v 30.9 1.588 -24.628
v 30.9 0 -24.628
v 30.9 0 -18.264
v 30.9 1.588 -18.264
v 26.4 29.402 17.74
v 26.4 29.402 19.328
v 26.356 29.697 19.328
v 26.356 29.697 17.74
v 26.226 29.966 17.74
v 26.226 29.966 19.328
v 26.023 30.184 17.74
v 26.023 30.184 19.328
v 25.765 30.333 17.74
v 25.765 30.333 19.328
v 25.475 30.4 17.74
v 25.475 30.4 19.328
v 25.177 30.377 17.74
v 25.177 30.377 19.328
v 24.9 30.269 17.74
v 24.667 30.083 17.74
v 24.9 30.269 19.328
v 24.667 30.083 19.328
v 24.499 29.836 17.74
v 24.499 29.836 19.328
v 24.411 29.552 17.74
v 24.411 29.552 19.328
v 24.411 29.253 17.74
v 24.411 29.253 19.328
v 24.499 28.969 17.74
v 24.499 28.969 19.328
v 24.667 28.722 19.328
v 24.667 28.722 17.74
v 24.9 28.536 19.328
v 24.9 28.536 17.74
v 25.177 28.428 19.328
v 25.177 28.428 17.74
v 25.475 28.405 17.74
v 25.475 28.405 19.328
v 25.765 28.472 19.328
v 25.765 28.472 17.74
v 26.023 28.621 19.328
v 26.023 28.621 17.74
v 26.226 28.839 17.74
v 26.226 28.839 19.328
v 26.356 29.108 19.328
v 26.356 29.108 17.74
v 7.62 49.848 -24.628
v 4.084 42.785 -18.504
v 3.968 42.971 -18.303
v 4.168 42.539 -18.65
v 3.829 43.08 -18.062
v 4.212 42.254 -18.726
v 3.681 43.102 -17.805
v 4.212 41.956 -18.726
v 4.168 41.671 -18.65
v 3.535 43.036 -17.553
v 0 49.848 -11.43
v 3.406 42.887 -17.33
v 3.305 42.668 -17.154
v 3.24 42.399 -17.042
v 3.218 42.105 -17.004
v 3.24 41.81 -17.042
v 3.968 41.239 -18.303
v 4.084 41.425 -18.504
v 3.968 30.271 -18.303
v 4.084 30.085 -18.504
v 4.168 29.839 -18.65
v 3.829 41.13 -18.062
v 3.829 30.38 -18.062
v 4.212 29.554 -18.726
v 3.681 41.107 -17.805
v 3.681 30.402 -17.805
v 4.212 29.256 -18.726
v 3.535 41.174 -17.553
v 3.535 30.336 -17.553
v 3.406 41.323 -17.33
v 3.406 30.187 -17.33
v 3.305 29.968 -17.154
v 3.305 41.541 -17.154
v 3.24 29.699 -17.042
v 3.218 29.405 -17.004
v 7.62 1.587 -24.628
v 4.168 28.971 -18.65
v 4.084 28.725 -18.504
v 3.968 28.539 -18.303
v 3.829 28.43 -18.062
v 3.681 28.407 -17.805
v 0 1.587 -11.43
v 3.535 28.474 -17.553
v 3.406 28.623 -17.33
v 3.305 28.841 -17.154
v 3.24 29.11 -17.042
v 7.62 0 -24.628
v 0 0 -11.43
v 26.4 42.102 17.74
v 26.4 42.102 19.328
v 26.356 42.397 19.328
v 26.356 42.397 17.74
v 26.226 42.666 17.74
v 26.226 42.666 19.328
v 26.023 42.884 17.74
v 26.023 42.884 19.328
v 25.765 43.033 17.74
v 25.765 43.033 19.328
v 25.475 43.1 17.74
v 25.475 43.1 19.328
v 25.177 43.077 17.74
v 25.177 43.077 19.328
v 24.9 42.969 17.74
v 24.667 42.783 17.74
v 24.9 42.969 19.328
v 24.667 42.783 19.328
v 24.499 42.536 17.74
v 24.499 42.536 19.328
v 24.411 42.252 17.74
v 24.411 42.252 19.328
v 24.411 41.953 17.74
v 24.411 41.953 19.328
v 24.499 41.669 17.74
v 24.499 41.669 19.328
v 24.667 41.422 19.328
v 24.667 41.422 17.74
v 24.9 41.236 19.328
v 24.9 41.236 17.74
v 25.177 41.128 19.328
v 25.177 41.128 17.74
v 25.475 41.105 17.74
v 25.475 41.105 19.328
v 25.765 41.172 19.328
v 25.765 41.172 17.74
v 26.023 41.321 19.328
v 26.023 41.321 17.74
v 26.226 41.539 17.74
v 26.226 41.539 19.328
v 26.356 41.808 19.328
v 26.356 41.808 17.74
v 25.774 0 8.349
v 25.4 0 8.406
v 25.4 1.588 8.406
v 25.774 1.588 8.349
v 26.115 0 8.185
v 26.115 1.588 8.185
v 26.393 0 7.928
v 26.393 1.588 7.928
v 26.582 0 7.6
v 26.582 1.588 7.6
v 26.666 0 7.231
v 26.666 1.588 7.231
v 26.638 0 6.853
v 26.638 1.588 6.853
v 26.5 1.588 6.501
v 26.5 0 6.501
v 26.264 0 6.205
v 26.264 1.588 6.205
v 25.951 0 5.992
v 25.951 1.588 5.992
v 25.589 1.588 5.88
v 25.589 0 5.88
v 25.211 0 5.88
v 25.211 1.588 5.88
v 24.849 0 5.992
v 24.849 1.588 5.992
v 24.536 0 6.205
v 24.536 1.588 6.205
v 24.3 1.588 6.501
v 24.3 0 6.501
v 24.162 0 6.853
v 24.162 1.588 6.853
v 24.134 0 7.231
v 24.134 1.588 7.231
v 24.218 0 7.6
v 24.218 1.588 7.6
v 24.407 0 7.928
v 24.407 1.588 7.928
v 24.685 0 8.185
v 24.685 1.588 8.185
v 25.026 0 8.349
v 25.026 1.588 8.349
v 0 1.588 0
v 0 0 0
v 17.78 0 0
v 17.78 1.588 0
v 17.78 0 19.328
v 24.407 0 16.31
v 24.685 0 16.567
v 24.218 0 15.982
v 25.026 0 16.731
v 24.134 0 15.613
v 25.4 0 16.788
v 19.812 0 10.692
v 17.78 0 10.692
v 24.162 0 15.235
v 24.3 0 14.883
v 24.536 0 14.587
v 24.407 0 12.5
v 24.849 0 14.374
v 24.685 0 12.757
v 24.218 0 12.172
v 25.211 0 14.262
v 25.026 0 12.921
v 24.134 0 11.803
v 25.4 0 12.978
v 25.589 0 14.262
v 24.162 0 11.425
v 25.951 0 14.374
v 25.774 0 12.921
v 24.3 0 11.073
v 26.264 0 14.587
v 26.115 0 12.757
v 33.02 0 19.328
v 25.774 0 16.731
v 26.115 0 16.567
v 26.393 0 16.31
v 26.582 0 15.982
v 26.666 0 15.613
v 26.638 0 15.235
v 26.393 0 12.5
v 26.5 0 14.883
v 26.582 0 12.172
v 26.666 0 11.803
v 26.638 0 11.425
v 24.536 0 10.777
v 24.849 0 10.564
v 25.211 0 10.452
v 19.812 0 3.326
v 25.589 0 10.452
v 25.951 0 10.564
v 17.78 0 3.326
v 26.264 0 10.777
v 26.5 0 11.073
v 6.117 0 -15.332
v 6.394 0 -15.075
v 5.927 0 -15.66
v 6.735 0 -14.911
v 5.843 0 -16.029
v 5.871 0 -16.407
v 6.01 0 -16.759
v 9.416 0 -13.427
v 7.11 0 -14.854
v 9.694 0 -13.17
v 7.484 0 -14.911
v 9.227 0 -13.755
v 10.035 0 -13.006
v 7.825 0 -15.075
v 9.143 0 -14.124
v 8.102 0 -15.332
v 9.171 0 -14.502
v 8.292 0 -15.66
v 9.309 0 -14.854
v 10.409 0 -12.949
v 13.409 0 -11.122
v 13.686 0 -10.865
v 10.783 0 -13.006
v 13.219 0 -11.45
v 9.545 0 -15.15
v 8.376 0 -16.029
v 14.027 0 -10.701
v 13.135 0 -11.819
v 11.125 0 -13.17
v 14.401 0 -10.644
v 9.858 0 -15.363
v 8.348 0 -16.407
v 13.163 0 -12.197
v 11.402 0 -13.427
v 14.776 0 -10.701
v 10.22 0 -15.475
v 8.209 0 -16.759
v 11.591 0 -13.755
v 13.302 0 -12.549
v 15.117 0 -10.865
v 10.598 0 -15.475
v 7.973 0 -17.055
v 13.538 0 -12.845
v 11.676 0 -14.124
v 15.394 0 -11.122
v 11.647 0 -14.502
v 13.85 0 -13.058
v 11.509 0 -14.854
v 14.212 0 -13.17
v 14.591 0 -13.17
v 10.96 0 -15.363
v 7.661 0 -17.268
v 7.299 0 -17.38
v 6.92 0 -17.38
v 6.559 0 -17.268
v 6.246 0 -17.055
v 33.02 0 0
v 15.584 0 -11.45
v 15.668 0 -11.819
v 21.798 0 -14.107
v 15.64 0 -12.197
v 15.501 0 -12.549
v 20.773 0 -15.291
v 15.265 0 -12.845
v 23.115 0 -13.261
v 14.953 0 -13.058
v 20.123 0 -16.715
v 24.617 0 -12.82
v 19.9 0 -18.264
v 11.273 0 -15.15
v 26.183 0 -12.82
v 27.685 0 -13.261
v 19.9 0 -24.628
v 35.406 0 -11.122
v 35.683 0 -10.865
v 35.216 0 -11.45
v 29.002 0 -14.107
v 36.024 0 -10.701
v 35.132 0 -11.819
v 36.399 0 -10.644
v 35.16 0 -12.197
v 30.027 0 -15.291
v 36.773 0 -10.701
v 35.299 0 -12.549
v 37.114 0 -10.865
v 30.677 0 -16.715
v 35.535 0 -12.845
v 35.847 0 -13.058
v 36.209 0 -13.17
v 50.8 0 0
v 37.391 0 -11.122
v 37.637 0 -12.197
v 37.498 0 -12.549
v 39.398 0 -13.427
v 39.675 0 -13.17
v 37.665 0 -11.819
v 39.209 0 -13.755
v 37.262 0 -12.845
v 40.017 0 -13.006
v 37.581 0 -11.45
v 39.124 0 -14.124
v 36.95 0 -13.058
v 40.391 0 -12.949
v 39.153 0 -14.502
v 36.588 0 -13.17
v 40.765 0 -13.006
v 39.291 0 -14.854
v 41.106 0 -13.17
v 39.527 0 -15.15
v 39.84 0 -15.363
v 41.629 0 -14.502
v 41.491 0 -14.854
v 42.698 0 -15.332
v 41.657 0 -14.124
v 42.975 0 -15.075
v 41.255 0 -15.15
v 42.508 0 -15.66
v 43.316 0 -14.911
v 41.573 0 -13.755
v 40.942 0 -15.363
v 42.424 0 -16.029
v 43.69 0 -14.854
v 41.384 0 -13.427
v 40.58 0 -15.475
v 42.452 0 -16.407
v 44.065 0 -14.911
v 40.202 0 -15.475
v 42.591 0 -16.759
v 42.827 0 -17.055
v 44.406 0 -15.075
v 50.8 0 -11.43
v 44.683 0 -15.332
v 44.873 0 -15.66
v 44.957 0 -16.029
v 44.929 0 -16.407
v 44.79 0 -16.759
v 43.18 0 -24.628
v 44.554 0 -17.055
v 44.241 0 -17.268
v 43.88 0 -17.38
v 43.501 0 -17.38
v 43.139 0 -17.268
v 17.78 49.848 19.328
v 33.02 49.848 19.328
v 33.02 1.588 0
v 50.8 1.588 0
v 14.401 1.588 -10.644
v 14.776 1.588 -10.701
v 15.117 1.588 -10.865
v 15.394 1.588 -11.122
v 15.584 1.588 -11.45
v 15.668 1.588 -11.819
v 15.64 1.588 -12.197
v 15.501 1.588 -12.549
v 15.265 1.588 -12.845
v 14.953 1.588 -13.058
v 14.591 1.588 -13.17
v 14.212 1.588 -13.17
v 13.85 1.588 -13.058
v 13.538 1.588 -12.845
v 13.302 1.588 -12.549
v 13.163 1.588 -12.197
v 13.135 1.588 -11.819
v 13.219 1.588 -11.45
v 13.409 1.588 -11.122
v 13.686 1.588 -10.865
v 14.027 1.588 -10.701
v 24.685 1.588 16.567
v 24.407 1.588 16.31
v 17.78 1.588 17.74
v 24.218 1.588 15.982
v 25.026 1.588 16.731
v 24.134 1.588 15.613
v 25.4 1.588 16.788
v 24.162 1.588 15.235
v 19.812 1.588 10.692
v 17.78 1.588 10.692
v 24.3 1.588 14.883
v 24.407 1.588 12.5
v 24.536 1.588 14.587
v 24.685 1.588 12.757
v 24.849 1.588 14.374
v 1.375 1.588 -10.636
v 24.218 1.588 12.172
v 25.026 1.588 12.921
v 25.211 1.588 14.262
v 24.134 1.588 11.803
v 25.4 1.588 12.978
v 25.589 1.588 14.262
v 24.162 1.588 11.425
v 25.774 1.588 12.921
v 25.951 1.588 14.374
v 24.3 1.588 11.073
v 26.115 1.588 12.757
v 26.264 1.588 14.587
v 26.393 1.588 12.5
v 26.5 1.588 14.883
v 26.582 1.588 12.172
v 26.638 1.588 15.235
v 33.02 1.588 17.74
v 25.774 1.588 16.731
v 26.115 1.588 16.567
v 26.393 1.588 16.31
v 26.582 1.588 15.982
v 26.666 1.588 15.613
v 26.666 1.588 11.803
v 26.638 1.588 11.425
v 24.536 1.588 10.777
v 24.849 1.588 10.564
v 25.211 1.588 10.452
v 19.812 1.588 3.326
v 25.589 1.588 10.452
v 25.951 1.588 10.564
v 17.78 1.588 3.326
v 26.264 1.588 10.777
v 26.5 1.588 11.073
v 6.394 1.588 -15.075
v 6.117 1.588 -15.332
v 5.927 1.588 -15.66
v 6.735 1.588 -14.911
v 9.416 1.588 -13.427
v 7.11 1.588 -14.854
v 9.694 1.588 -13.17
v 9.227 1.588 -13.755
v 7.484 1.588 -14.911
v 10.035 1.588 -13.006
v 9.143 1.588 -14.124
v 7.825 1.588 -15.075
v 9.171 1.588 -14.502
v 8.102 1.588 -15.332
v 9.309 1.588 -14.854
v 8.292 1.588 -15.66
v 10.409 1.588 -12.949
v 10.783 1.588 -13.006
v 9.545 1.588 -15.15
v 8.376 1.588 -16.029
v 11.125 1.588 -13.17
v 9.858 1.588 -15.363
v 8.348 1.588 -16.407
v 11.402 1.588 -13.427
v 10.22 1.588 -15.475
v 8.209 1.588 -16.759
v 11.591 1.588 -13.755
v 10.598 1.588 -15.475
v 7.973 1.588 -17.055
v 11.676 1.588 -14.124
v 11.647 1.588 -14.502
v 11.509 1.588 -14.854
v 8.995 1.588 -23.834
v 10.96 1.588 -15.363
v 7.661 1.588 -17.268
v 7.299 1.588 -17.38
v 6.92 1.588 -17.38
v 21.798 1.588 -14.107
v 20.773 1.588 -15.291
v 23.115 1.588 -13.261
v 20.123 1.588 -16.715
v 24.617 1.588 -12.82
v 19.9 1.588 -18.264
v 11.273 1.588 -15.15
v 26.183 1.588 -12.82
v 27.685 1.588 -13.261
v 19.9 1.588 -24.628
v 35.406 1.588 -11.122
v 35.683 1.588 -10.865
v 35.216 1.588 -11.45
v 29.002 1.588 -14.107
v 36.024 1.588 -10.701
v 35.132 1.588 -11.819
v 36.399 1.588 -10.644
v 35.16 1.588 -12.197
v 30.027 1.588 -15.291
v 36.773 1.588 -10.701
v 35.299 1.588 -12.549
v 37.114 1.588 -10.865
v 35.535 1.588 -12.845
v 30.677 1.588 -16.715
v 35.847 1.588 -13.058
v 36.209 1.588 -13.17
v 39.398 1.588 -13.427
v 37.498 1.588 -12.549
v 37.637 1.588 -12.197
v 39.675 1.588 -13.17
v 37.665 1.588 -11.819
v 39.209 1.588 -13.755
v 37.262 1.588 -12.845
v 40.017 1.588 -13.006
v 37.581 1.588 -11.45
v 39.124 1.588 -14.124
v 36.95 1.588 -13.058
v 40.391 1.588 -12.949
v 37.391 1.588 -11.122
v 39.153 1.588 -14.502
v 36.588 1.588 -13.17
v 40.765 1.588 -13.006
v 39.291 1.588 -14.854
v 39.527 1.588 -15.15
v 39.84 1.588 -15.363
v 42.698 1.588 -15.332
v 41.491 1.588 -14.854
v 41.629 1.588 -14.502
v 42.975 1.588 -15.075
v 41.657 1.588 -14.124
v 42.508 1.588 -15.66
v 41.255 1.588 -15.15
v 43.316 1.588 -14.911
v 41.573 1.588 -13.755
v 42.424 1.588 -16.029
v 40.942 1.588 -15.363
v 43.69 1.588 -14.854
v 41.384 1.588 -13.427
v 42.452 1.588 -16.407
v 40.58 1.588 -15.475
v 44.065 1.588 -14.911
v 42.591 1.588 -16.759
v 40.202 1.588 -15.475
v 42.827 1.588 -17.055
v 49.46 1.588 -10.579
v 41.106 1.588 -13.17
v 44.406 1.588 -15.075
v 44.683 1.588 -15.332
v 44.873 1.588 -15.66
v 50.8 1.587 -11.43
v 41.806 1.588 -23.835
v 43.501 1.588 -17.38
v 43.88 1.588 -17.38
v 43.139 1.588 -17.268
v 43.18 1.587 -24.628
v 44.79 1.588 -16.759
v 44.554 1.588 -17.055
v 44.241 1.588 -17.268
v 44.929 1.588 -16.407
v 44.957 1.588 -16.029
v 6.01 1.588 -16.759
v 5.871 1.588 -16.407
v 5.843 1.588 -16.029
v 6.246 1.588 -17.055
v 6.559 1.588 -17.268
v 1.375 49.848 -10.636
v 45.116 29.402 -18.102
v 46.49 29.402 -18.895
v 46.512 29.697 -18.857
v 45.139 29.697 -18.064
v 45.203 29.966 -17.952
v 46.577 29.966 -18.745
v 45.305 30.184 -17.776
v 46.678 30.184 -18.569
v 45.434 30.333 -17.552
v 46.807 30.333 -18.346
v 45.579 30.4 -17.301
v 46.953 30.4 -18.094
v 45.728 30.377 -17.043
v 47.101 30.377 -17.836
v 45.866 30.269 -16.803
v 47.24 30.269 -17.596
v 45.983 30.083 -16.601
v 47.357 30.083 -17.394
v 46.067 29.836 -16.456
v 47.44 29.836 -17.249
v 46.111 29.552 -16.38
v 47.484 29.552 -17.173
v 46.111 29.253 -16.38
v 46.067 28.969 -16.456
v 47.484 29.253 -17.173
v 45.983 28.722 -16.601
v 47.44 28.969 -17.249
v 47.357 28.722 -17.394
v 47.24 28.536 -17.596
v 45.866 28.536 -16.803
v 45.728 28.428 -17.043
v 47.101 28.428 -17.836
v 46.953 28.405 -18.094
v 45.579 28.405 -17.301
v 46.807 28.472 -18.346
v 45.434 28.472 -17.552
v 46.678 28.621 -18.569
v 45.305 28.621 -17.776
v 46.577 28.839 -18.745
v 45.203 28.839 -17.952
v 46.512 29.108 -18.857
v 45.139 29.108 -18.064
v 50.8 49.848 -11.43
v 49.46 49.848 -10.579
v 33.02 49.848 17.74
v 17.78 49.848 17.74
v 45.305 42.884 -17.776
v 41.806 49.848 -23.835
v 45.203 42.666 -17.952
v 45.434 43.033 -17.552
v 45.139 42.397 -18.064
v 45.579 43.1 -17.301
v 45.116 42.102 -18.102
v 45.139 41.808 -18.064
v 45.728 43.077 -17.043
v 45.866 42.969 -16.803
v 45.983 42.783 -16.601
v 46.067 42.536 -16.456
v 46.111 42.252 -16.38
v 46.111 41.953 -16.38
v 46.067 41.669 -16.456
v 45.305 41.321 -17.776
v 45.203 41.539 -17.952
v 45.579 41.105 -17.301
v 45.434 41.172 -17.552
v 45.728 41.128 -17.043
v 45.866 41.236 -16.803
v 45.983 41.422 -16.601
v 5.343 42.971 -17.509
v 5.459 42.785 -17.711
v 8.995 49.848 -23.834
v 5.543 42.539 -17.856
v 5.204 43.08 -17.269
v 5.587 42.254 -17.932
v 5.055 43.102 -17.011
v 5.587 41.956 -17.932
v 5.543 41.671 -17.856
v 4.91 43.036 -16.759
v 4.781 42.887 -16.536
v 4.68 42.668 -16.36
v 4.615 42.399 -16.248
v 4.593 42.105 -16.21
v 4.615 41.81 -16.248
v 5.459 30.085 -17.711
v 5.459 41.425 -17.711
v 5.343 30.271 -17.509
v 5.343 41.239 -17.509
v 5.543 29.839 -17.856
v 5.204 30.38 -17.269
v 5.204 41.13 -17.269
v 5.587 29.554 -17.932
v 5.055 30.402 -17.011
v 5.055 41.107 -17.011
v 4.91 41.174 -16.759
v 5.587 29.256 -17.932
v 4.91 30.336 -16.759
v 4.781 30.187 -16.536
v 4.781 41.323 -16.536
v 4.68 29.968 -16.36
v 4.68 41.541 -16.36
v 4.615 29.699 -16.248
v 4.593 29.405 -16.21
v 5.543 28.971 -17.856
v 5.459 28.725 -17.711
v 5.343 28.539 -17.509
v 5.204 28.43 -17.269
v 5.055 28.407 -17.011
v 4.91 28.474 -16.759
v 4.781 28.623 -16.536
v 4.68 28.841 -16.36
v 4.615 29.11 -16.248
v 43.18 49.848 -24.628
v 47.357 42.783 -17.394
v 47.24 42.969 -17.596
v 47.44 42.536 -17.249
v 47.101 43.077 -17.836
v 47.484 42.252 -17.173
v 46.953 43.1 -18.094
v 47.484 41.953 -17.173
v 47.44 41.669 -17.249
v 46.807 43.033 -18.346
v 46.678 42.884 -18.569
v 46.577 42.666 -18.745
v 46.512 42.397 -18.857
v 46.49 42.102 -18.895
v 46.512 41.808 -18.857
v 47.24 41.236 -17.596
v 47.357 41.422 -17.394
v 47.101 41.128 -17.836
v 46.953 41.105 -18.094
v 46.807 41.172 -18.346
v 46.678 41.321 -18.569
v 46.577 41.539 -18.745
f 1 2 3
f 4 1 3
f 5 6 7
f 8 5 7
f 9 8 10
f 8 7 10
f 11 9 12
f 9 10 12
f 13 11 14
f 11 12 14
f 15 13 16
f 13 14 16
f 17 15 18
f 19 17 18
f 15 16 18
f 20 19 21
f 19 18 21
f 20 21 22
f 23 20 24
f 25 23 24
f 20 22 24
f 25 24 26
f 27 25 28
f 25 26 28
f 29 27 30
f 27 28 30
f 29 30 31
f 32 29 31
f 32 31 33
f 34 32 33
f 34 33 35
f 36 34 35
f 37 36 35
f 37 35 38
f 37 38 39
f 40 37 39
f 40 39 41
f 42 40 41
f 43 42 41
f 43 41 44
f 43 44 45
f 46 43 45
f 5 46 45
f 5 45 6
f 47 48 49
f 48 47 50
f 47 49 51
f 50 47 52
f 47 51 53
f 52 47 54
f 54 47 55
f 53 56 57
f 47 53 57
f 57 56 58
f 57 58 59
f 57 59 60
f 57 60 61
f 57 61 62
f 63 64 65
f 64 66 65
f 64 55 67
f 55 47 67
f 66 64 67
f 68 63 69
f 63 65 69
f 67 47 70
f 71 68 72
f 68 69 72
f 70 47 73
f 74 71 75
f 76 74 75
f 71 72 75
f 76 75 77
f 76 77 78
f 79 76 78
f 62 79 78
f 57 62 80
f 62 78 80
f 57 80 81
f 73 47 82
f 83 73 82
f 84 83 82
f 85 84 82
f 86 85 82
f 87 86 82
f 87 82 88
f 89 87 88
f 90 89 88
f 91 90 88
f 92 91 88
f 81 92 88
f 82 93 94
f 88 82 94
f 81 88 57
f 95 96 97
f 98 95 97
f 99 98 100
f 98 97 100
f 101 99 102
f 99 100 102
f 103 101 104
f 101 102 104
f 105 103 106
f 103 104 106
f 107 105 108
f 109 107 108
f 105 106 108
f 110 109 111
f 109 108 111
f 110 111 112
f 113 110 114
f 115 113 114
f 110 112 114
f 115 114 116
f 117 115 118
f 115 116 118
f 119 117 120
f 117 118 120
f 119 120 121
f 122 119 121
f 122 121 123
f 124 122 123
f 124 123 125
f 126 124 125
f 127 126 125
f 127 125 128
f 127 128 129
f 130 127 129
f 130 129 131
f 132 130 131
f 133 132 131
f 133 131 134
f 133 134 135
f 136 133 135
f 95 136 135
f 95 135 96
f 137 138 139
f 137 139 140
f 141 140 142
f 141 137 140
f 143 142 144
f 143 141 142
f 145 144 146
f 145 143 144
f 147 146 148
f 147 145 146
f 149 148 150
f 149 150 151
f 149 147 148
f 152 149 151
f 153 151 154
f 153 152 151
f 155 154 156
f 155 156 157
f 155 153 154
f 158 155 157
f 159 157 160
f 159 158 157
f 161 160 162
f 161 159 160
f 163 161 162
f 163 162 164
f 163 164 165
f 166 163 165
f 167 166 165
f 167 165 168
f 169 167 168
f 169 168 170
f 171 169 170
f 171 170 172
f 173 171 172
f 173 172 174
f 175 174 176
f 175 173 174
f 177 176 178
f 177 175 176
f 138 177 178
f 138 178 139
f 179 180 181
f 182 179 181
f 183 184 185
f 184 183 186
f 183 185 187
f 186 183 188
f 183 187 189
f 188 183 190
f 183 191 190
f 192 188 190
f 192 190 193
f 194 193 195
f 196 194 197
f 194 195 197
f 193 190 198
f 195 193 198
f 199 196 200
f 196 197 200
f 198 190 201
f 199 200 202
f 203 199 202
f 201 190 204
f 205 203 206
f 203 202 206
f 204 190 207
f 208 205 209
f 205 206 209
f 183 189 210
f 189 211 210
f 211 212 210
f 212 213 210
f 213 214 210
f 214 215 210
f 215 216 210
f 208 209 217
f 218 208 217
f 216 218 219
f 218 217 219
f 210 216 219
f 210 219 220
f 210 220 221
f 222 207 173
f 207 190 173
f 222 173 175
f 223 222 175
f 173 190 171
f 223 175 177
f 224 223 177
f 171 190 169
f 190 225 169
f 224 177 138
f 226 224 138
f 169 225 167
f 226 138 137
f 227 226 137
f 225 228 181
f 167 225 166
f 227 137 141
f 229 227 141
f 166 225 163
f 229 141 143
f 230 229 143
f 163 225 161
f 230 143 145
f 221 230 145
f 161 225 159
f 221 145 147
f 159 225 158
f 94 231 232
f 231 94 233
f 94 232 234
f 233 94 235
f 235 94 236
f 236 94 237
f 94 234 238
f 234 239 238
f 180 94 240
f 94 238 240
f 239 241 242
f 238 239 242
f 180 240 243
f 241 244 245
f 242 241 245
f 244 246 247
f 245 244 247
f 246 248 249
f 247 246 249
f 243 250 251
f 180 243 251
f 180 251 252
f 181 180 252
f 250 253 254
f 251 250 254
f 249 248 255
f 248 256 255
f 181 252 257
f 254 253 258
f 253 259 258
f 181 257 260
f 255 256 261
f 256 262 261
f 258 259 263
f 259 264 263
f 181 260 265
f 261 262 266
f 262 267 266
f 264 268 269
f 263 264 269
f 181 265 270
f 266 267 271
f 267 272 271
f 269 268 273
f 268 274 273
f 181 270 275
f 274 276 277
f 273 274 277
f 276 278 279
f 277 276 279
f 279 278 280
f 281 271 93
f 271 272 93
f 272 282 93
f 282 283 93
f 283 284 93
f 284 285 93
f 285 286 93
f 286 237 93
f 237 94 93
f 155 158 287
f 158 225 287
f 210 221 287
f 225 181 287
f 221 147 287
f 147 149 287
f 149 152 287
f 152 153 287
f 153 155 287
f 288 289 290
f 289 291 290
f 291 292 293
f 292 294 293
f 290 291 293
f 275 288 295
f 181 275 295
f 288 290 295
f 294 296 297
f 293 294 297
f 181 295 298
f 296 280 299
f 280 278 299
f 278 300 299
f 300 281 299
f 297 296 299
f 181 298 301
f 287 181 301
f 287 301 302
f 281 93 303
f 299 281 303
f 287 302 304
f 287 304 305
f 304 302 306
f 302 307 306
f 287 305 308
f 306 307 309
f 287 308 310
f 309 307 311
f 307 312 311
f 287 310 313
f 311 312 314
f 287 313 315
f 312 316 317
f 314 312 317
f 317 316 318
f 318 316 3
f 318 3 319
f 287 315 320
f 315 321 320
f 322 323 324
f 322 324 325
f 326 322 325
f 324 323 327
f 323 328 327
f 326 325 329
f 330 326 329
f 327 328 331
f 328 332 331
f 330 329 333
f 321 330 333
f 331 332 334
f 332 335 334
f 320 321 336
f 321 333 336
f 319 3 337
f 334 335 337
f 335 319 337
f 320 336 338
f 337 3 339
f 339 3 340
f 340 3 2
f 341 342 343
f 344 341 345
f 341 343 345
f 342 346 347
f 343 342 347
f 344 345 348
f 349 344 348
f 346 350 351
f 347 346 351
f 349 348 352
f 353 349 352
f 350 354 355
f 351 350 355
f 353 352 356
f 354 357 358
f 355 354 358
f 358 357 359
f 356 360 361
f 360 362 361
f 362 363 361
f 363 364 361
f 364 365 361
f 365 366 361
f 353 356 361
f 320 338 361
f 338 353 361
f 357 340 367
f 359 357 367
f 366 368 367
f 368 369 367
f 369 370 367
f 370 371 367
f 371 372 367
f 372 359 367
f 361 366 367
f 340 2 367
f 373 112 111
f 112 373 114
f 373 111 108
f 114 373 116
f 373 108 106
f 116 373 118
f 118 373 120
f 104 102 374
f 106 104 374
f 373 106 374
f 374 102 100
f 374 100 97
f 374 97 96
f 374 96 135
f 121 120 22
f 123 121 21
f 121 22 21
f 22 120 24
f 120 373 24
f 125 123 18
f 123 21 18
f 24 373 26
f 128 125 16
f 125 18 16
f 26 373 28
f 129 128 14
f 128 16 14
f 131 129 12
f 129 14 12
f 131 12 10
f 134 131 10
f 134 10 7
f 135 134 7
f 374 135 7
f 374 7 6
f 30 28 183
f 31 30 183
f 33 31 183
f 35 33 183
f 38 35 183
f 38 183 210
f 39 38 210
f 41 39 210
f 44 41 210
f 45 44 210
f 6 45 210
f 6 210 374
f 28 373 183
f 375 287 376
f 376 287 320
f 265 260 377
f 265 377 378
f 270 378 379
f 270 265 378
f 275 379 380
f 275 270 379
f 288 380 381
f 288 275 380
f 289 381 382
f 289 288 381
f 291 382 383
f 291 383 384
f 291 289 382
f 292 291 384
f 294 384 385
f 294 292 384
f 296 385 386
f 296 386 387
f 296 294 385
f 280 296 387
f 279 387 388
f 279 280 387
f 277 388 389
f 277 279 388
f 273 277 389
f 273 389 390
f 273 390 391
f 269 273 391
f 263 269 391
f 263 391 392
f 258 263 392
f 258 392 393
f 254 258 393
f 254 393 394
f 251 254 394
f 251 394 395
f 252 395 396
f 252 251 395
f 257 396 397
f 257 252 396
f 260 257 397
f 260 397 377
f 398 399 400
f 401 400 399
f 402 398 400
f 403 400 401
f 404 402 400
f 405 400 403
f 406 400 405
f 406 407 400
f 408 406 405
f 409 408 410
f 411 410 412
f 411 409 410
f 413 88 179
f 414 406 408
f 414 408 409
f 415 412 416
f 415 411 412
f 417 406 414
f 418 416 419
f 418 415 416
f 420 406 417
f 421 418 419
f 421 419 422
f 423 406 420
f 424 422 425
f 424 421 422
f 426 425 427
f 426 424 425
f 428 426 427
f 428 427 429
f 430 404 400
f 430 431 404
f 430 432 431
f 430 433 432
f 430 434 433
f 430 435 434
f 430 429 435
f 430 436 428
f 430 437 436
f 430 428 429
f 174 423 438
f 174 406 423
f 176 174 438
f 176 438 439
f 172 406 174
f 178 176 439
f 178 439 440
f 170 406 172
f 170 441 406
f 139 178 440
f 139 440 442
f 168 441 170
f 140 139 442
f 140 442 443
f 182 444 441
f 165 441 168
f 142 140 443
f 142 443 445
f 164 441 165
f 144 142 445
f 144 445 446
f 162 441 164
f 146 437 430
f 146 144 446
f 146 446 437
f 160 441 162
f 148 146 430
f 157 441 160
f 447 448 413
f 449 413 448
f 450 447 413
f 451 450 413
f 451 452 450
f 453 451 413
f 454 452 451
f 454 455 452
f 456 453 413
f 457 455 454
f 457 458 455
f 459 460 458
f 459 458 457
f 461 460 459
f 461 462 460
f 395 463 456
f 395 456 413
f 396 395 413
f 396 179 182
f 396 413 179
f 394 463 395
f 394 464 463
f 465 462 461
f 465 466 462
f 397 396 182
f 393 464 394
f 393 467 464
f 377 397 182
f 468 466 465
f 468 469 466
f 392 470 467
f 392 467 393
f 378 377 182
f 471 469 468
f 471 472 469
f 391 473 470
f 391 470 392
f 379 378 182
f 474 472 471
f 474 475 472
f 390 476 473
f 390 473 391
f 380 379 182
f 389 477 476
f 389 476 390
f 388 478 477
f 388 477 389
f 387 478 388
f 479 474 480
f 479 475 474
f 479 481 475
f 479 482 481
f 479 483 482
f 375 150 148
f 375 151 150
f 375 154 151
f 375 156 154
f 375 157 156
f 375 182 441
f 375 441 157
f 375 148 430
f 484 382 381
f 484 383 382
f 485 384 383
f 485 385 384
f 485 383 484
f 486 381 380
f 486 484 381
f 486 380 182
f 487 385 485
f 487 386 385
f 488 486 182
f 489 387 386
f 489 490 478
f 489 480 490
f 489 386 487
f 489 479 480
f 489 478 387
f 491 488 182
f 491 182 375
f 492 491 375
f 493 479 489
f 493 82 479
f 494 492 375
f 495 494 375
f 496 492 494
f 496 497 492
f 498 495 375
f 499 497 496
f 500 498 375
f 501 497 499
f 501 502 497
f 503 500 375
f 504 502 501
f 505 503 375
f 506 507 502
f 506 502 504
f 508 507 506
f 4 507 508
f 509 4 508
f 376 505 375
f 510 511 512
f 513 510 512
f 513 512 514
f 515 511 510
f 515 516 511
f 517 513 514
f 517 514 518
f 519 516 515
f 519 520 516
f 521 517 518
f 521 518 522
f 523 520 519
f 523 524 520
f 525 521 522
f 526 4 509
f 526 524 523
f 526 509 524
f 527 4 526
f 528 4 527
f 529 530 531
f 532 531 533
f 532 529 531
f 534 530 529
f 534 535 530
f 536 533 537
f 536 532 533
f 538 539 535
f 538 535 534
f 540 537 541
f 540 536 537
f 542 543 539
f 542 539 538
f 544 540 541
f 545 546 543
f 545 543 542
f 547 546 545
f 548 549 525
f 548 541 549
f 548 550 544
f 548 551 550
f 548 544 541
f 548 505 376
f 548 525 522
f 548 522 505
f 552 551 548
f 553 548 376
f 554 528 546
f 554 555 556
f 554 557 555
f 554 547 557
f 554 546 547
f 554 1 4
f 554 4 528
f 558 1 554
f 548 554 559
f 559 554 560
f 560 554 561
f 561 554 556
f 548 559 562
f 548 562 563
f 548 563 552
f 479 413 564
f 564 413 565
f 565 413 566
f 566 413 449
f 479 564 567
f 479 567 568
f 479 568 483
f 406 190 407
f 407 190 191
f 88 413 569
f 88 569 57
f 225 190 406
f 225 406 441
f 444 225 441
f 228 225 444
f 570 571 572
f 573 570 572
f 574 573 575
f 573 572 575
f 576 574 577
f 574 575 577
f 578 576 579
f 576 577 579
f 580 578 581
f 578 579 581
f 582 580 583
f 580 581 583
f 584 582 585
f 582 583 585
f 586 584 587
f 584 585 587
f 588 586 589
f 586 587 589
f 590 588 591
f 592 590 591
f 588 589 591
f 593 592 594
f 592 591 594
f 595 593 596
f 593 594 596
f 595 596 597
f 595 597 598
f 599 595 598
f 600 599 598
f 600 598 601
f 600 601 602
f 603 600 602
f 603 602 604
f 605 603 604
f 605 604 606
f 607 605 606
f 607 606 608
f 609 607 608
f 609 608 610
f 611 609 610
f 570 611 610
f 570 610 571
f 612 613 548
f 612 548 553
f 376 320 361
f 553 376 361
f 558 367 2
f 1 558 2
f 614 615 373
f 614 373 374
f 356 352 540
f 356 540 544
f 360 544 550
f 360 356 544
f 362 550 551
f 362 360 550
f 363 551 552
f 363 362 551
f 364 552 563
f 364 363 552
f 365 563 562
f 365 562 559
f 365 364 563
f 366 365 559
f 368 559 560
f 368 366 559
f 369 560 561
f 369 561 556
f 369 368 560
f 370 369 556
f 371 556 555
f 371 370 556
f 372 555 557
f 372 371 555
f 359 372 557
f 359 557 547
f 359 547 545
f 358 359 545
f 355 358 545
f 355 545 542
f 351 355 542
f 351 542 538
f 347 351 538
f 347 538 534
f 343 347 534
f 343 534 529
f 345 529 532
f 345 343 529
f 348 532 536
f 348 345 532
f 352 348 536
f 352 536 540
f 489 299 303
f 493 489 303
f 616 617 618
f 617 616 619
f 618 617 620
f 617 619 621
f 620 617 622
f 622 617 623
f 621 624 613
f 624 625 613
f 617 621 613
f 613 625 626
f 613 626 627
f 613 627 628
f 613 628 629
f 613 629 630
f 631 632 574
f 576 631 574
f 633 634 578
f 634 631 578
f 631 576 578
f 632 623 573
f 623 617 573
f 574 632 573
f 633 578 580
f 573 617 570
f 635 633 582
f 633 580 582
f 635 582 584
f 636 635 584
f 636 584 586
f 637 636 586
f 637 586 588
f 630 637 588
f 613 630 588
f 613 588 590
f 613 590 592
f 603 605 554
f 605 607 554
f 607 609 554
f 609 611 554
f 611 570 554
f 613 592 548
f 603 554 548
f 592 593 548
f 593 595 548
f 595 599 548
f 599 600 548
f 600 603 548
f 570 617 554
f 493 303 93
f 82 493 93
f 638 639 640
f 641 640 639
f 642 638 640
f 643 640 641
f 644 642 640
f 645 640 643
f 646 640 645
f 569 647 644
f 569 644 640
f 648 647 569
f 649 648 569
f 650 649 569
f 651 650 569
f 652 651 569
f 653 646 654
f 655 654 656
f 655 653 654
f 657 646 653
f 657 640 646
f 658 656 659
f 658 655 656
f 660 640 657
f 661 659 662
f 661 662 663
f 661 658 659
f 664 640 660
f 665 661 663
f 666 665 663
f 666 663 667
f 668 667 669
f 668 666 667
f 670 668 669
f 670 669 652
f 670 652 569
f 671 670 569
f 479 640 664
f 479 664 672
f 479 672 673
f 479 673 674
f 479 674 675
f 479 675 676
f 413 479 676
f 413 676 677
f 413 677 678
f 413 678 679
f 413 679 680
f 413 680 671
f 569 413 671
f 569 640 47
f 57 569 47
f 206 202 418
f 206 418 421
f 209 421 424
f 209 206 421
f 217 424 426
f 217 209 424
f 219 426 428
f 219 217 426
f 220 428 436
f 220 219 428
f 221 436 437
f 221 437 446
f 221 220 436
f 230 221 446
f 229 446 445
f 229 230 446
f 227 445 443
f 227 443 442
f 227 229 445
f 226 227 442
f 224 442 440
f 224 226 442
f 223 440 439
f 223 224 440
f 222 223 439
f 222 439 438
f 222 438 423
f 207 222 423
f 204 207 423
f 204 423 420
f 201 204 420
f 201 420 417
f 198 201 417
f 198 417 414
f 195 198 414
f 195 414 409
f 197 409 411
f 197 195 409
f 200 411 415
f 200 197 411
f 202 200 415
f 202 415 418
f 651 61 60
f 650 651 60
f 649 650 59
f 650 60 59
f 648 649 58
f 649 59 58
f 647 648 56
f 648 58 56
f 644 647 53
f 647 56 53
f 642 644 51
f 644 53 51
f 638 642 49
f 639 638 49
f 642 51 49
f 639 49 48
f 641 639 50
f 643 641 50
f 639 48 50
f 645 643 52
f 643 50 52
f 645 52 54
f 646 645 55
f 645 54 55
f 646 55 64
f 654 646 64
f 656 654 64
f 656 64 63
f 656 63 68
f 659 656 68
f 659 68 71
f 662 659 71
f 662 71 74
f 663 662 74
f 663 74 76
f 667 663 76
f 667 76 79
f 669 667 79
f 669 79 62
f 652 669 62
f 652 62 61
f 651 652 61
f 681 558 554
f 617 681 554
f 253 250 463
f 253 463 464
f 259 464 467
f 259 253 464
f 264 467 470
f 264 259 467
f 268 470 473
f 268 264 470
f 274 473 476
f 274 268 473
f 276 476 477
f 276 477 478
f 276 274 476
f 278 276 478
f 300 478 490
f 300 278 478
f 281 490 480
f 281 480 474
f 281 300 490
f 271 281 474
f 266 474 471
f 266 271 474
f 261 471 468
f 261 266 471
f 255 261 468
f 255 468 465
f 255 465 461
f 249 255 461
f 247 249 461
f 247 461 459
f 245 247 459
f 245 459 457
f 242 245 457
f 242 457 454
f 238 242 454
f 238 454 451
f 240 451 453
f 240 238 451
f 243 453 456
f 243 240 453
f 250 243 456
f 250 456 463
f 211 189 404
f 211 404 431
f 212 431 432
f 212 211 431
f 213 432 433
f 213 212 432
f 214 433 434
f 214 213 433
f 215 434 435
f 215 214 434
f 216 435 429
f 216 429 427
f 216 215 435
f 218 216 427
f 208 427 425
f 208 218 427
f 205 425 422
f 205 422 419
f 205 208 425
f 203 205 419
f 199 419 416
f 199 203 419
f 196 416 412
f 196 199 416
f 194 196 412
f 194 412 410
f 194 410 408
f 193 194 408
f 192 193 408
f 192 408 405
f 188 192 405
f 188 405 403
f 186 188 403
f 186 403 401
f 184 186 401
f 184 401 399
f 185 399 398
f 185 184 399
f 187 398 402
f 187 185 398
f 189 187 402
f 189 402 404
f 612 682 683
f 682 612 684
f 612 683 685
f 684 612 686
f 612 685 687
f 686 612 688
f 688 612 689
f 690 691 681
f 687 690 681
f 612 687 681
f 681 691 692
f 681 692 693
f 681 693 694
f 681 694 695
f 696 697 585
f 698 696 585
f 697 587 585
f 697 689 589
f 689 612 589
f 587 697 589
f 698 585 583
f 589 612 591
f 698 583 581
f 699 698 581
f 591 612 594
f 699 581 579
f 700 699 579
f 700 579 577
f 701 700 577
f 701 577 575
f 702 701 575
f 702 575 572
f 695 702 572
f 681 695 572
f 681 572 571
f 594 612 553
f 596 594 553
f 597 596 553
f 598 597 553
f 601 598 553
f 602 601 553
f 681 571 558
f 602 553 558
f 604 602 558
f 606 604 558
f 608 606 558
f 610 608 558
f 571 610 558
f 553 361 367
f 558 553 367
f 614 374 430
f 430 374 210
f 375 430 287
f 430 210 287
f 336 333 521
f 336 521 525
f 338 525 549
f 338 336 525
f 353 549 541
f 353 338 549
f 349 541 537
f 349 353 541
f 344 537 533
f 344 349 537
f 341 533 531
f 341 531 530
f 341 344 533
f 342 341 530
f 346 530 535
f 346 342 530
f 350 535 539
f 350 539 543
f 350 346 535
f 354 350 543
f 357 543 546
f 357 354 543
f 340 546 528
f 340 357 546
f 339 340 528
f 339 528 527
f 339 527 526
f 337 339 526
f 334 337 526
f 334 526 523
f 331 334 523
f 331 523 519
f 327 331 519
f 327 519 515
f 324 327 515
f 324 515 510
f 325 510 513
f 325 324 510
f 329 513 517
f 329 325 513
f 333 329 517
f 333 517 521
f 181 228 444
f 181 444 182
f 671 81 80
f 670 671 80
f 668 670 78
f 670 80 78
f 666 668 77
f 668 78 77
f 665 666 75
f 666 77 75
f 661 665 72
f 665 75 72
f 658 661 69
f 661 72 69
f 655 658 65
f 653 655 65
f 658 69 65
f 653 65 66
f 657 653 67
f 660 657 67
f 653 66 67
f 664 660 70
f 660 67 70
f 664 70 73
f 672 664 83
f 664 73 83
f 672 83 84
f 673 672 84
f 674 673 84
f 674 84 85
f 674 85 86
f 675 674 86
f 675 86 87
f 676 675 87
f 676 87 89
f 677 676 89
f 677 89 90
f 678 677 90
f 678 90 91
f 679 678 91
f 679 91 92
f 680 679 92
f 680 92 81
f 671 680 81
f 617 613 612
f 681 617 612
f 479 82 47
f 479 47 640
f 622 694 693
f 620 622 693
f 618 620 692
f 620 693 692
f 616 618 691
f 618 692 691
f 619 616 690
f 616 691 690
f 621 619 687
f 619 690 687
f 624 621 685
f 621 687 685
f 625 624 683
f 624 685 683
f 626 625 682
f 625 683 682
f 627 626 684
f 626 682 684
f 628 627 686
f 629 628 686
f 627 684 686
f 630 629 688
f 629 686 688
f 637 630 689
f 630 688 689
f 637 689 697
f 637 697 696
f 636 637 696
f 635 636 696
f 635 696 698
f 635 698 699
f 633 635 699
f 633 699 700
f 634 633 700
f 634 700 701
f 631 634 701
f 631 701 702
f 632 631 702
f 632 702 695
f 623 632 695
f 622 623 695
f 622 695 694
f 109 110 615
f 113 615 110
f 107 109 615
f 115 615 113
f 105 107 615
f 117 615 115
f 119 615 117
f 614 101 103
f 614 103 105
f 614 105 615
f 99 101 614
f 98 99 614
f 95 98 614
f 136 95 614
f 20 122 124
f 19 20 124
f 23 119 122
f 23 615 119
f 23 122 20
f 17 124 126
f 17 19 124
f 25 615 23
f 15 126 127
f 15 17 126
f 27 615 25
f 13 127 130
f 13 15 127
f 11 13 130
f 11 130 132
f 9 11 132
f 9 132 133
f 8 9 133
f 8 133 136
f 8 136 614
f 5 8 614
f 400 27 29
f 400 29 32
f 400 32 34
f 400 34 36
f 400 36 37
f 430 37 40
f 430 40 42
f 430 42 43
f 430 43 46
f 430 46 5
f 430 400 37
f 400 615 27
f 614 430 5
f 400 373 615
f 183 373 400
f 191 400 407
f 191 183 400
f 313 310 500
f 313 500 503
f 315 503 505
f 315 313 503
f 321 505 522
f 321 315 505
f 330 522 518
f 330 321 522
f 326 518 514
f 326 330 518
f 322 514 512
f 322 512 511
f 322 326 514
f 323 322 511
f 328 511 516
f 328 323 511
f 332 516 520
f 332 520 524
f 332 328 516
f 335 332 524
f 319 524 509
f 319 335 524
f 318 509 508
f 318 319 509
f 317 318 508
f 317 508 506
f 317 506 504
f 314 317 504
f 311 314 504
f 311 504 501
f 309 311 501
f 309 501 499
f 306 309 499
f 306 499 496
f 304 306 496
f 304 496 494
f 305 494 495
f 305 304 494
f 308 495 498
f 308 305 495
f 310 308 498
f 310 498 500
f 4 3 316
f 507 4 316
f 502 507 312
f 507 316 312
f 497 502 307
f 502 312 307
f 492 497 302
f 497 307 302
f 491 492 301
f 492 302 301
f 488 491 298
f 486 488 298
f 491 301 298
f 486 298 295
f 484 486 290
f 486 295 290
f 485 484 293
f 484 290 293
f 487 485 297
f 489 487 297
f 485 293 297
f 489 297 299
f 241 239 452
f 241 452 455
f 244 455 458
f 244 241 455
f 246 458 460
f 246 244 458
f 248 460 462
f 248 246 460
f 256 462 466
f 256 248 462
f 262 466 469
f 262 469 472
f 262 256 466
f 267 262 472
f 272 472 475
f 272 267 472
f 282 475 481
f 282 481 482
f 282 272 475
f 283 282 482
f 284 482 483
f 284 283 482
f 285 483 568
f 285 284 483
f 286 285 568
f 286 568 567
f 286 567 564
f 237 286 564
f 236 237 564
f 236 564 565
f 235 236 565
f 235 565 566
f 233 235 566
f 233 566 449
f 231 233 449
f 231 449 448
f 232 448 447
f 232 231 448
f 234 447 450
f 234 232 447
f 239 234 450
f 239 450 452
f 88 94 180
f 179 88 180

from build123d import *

# Parameters (mm, degrees)
SKETCH1_R           = 1.27
BOSS_EXTRUDE2_DEPTH = 1.5875
SKETCH2_W           = 15.24
SKETCH2_H           = 1.5875
BOSS_EXTRUDE3_DEPTH = 48.26
SKETCH3_R           = 1
CUT_EXTRUDE1_DEPTH  = 2.54
SKETCH4_R           = 1
CUT_EXTRUDE2_DEPTH  = 2.54
SKETCH5_R           = 1
CUT_EXTRUDE3_DEPTH  = 2.54
SKETCH6_W           = 2.032
SKETCH6_H           = 7.366
CUT_EXTRUDE4_DEPTH  = 2.54


with BuildPart() as part:
    # Sketch1 → Boss-Extrude2 (new body)
    with BuildSketch(Plane(origin=(0, 0, 0), x_dir=(1, 0, 0), z_dir=(0, 1, 0))):
        with BuildLine():
            Line((50.8, 0), (50.8, 11.43))
            Line((50.8, 11.43), (43.18, 24.628227154))
            Line((43.18, 24.628227154), (30.9, 24.628227154))
            Line((30.9, 24.628227154), (30.9, 18.264121265))
            ThreePointArc((30.9, 18.264121265), (25.4, 12.764121265), (19.9, 18.264121265))
            Line((19.9, 18.264121265), (19.9, 24.628227154))
            Line((19.9, 24.628227154), (7.62, 24.628227154))
            Line((7.62, 24.628227154), (0, 11.43))
            Line((0, 11.43), (0, 0))
            Line((0, 0), (17.78, 0))
            Line((17.78, 0), (17.78, -19.327878735))
            Line((17.78, -19.327878735), (33.02, -19.327878735))
            Line((33.02, -19.327878735), (33.02, 0))
            Line((33.02, 0), (50.8, 0))
        make_face()
        with Locations(Location((14.401477372, 11.914121265, 0), (0, 0, 270))):
            Circle(SKETCH1_R, mode=Mode.SUBTRACT)
        with Locations(Location((36.398522628, 11.914121265, 0), (0, 0, 270))):
            Circle(SKETCH1_R, mode=Mode.SUBTRACT)
        with Locations(Location((10.409113577, 14.219113577, 0), (0, 0, 270))):
            Circle(SKETCH1_R, mode=Mode.SUBTRACT)
        with Locations(Location((40.390886423, 14.219113577, 0), (0, 0, 270))):
            Circle(SKETCH1_R, mode=Mode.SUBTRACT)
        with Locations(Location((43.690443212, 16.124113577, 0), (0, 0, 270))):
            Circle(SKETCH1_R, mode=Mode.SUBTRACT)
        with Locations(Location((7.109556788, 16.124113577, 0), (0, 0, 270))):
            Circle(SKETCH1_R, mode=Mode.SUBTRACT)
        with Locations(Location((25.4, -7.135878735, 0), (0, 0, 270))):
            Circle(SKETCH1_R, mode=Mode.SUBTRACT)
        with Locations(Location((25.4, -15.517878735, 0), (0, 0, 270))):
            Circle(SKETCH1_R, mode=Mode.SUBTRACT)
        with Locations(Location((25.4, -11.707878735, 0), (0, 0, 270))):
            Circle(SKETCH1_R, mode=Mode.SUBTRACT)
    extrude(amount=BOSS_EXTRUDE2_DEPTH)

    # Sketch2 → Boss-Extrude3 (add)
    with BuildSketch(Plane(origin=(0, 1.5875, 0), x_dir=(1, 0, 0), z_dir=(0, 1, 0))):
        with Locations((25.4, -18.534128735)):
            Rectangle(SKETCH2_W, SKETCH2_H)
        Polygon((0, 11.43), (7.62, 24.628227154), (8.994815329, 23.834477154), (1.374815329, 10.63625), align=None)
        Polygon((50.8, 11.43), (43.18, 24.628227154), (41.806418442, 23.835189471), (49.460038325, 10.578730971), align=None)
    extrude(amount=BOSS_EXTRUDE3_DEPTH)

    # Sketch3 → Cut-Extrude1 (cut)
    with BuildSketch(Plane.XY.offset(19.327878735)):
        with Locations((25.4, 42.1025)):
            Circle(SKETCH3_R)
        with Locations((25.4, 29.4025)):
            Circle(SKETCH3_R)
    extrude(amount=-CUT_EXTRUDE1_DEPTH, mode=Mode.SUBTRACT)

    # Sketch4 → Cut-Extrude2 (cut)
    with BuildSketch(Plane(origin=(43.049335183, 0, -24.854545256), x_dir=(-0.5000000000000016, 0, -0.8660254037844378), z_dir=(0.8660254037844378, 0, -0.5000000000000016))):
        with Locations((-7.881329635, 42.1025)):
            Circle(SKETCH4_R)
        with Locations((-7.881329635, 29.4025)):
            Circle(SKETCH4_R)
    extrude(amount=-CUT_EXTRUDE2_DEPTH, mode=Mode.SUBTRACT)

    # Sketch5 → Cut-Extrude3 (cut)
    with BuildSketch(Plane(origin=(-4.949335183, 0, -2.8575), x_dir=(-0.5000000000000012, 0, 0.866025403784438), z_dir=(-0.8660254037844379, 0, -0.5000000000000011))):
        with Locations((-17.334430776, 42.104691674)):
            Circle(SKETCH5_R)
        with Locations((-17.334430776, 29.404691674)):
            Circle(SKETCH5_R)
    extrude(amount=-CUT_EXTRUDE3_DEPTH, mode=Mode.SUBTRACT)

    # Sketch6 → Cut-Extrude4 (cut)
    with BuildSketch(Plane(origin=(0, 0, 0), x_dir=(-1, 0, 0), z_dir=(0, -1, 0))):
        with Locations((-18.796, -7.008878735)):
            Rectangle(SKETCH6_W, SKETCH6_H)
    extrude(amount=-CUT_EXTRUDE4_DEPTH, mode=Mode.SUBTRACT)


solid = part.part
